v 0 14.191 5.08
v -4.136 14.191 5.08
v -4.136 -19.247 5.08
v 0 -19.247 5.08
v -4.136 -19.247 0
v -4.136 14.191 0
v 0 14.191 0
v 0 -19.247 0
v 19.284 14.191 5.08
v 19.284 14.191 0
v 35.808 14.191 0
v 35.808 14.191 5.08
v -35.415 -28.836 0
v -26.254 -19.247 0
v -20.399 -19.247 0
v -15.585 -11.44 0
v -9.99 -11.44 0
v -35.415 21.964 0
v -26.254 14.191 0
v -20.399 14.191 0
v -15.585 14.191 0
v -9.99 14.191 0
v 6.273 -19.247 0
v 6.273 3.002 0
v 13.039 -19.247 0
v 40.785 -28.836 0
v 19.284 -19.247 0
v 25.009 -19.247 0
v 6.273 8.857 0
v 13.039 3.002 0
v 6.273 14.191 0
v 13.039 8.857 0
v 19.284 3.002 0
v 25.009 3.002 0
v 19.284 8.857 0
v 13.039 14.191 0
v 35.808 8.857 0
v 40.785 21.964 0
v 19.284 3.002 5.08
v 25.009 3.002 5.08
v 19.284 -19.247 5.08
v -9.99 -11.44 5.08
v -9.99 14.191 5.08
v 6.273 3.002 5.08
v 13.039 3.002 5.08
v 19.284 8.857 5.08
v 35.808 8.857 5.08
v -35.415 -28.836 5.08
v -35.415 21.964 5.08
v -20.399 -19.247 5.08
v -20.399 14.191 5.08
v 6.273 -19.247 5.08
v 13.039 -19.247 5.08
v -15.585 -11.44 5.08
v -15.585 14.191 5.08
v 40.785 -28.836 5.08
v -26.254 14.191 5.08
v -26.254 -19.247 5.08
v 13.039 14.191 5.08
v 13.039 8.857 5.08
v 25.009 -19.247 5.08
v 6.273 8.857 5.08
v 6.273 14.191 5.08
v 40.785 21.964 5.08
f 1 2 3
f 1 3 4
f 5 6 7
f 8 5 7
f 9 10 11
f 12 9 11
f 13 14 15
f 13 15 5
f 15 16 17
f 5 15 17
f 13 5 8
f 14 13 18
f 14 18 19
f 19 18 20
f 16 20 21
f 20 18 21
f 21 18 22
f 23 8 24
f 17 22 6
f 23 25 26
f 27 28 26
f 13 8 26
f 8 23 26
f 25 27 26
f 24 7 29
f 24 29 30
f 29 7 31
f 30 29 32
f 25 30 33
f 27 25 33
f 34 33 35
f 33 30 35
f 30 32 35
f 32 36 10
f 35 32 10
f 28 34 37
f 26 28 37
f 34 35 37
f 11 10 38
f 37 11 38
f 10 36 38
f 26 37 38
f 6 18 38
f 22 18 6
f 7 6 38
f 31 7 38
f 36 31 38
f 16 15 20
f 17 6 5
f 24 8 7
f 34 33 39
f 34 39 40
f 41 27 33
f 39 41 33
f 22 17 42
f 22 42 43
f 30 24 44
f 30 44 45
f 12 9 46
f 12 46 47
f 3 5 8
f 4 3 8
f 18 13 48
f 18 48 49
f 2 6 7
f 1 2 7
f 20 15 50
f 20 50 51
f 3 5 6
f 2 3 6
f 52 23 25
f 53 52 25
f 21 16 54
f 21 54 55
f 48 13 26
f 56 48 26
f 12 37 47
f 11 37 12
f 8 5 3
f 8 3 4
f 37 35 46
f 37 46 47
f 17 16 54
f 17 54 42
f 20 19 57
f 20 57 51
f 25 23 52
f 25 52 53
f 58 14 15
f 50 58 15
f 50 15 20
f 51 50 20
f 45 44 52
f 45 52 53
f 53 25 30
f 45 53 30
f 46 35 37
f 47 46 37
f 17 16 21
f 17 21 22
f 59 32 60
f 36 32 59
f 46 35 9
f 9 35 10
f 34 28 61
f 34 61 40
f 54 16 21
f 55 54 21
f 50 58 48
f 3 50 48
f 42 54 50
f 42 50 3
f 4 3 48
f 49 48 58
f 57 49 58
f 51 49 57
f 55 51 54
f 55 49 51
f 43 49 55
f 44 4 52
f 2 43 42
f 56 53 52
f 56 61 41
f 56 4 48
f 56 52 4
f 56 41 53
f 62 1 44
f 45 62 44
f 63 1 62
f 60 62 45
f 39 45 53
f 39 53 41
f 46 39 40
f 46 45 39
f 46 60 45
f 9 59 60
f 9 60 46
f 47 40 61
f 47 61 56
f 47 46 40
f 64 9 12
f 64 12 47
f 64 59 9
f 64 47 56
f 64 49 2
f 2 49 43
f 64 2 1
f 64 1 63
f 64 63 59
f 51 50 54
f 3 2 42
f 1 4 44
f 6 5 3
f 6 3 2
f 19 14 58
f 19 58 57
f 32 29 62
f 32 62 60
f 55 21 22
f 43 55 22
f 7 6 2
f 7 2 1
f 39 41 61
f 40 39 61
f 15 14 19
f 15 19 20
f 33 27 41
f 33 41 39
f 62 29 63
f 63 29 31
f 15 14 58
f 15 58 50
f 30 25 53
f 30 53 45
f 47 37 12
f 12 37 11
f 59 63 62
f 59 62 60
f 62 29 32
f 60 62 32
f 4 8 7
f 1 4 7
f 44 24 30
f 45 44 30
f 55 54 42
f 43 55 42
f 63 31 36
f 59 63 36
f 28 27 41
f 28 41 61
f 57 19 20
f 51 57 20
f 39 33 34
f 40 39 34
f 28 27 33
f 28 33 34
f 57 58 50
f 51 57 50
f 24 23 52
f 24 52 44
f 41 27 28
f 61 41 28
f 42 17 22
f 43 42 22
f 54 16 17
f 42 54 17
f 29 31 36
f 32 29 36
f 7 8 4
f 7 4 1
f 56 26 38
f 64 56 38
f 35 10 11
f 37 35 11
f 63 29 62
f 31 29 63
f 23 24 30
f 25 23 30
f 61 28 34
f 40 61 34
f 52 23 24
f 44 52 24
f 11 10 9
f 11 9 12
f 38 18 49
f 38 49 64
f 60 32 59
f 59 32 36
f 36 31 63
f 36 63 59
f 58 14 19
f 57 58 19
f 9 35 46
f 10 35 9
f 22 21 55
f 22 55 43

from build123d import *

# Parameters (mm, degrees)
F0_W     = 76.2
F0_H     = 50.8
F2_DEPTH = 5.08
F1_W     = 5.854954
F1_H     = 33.438297
F1_W_2   = 5.594734
F1_H_2   = 25.63169
F1_W_3   = 4.135536
F1_W_4   = 6.765726
F1_H_3   = 5.334515
F1_H_4   = 22.248828
F1_W_5   = 16.523983
F1_W_6   = 5.724842
F3_DEPTH = 5.08


with BuildPart() as f2:
    # F0 (on Top) → F2 (new body)
    with BuildSketch(Plane.XY):
        with Locations((2.685499, -3.435544)):
            Rectangle(F0_W, F0_H)
    extrude(amount=F2_DEPTH)


with BuildPart() as f3:
    # F1 (on Top) → F3 (new body)
    with BuildSketch(Plane.XY):
        with Locations((-23.326776, -2.52775)):
            Rectangle(F1_W, F1_H)
        with Locations((-12.787858, 1.375553)):
            Rectangle(F1_W_2, F1_H_2)
        with Locations((-2.067768, -2.52775)):
            Rectangle(F1_W_3, F1_H)
        with Locations((9.656135, 11.52414)):
            Rectangle(F1_W_4, F1_H_3)
        with Locations((9.656135, -8.122485)):
            Rectangle(F1_W_4, F1_H_4)
        with Locations((27.546273, 11.52414)):
            Rectangle(F1_W_5, F1_H_3)
        with Locations((22.146703, -8.122485)):
            Rectangle(F1_W_6, F1_H_4)
    extrude(amount=F3_DEPTH)


with BuildPart() as f2_1:
    add(f2.part)

    # F4: cut F3
    add(f3.part, mode=Mode.SUBTRACT)


solid = Compound([f3.part, f2_1.part])
